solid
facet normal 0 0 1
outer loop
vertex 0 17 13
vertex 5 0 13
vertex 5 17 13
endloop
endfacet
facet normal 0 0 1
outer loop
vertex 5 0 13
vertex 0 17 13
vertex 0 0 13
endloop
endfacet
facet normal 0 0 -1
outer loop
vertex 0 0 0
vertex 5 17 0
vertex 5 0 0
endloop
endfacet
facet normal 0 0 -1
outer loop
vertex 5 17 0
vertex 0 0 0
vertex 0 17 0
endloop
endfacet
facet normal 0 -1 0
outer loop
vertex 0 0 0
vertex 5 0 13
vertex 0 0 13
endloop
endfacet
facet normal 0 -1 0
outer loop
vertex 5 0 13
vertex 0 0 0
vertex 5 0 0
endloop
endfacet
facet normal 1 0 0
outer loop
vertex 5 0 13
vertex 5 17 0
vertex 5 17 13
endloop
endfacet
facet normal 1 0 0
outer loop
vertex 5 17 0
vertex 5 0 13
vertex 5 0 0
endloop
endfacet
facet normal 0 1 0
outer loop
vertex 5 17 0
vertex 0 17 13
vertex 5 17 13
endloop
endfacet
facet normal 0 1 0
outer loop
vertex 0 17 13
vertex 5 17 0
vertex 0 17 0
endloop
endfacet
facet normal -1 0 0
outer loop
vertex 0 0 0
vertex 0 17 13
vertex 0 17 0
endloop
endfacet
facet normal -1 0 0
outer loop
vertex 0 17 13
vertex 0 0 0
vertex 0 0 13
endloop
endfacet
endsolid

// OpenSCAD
// Generated by SolidPython 1.0.1 on 2020-07-29 00:46:54


cube(size = [5, 17, 13]);
/***********************************************
*********      SolidPython code:      **********
************************************************
 
# import packages: SolidPython
from solid import *
from solid.utils import *
from itertools import chain, combinations, permutations


class Resize:

    def __init__(self, scad_file):
        self.scad_file = scad_file
        #self.scad_file = import_scad(scad_file)
        # cone/cylinder param:
        self.r1 = 0
        self.r2 = 0
        self.h = 0
        # rectangular prism param:
        self.w = 0
        self.l = 0
        # ellipse param:
        self.r = 0

    # import OpenScad code (file name corresponds to shape)


    # classify shape + parameters
    def assign(self, param1, param2, param3):
        if self.scad_file == 'cone.scad':
            self.r1 = param1
            self.r2 = param2
            self.h = param3
        elif self.scad_file == 'cylinder.scad':
            self.r1 = param1
            self.r2 = param2
            self.h = param3
        elif self.scad_file == 'rectangularPrism.scad':
            self.h = param1
            self.l = param2
            self.w = param3
        else:
            self.r = param1
            self.h = param2

    # resize parameters
    def iterate(self):
        x = range(3, 20, 2)
        i = 1
        if self.scad_file == 'cone.scad':
            tempList = list(permutations(x, 2))
            for temp in tempList:
                param1 = temp[0]
                param2 = temp[1]
                filepath = 'produced_scad_files/' + 'cone' + str(param1) + '_' + str(param2) + '_' + '.scad'
                scad_render_to_file(cylinder(h=param1, r1=param2, r2=0), filepath)

        elif self.scad_file == 'cylinder.scad':
            tempList = list(permutations(x, 3))
            for temp in tempList:
                param1 = temp[0]
                param2 = temp[1]
                filepath = 'produced_scad_files/' + 'cylinder' + str(param1) + '_' + str(param2) + '_' + '.scad'
                scad_render_to_file(cylinder(h=param1, r1=param2, r2=param2), filepath)

        elif self.scad_file == 'rectangularPrism.scad':
            tempList = list(permutations(x, 3))
            for temp in tempList:
                param1 = temp[0]
                param2 = temp[1]
                param3 = temp[2]
                filepath = 'produced_scad_files/' + 'rectangularPrism' + str(param1) + '_' + str(param2) + '_' + str(
                    param3) + '.scad'
                scad_render_to_file(cube(size=(param1, param2, param3)), filepath)

        elif self.scad_file == 'ellipse.scad':
            tempList = list(permutations(x, 4))
            for temp in tempList:
                param1 = temp[0]
                param2 = temp[1]
                param3 = temp[2]
                param4 = temp[3]
                filepath = 'produced_scad_files/' + 'ellipse' + str(param1) + '_' + str(param2) + '_' + str(param3) + '_' + str(param4) + '.scad'
                scad_render_to_file(scale([param1, param2, param3])(sphere(r=param4)), filepath)

    def render_to_scadfile(self):
        scad_render_to_file(scad, 'example.scad') 
 
************************************************/
